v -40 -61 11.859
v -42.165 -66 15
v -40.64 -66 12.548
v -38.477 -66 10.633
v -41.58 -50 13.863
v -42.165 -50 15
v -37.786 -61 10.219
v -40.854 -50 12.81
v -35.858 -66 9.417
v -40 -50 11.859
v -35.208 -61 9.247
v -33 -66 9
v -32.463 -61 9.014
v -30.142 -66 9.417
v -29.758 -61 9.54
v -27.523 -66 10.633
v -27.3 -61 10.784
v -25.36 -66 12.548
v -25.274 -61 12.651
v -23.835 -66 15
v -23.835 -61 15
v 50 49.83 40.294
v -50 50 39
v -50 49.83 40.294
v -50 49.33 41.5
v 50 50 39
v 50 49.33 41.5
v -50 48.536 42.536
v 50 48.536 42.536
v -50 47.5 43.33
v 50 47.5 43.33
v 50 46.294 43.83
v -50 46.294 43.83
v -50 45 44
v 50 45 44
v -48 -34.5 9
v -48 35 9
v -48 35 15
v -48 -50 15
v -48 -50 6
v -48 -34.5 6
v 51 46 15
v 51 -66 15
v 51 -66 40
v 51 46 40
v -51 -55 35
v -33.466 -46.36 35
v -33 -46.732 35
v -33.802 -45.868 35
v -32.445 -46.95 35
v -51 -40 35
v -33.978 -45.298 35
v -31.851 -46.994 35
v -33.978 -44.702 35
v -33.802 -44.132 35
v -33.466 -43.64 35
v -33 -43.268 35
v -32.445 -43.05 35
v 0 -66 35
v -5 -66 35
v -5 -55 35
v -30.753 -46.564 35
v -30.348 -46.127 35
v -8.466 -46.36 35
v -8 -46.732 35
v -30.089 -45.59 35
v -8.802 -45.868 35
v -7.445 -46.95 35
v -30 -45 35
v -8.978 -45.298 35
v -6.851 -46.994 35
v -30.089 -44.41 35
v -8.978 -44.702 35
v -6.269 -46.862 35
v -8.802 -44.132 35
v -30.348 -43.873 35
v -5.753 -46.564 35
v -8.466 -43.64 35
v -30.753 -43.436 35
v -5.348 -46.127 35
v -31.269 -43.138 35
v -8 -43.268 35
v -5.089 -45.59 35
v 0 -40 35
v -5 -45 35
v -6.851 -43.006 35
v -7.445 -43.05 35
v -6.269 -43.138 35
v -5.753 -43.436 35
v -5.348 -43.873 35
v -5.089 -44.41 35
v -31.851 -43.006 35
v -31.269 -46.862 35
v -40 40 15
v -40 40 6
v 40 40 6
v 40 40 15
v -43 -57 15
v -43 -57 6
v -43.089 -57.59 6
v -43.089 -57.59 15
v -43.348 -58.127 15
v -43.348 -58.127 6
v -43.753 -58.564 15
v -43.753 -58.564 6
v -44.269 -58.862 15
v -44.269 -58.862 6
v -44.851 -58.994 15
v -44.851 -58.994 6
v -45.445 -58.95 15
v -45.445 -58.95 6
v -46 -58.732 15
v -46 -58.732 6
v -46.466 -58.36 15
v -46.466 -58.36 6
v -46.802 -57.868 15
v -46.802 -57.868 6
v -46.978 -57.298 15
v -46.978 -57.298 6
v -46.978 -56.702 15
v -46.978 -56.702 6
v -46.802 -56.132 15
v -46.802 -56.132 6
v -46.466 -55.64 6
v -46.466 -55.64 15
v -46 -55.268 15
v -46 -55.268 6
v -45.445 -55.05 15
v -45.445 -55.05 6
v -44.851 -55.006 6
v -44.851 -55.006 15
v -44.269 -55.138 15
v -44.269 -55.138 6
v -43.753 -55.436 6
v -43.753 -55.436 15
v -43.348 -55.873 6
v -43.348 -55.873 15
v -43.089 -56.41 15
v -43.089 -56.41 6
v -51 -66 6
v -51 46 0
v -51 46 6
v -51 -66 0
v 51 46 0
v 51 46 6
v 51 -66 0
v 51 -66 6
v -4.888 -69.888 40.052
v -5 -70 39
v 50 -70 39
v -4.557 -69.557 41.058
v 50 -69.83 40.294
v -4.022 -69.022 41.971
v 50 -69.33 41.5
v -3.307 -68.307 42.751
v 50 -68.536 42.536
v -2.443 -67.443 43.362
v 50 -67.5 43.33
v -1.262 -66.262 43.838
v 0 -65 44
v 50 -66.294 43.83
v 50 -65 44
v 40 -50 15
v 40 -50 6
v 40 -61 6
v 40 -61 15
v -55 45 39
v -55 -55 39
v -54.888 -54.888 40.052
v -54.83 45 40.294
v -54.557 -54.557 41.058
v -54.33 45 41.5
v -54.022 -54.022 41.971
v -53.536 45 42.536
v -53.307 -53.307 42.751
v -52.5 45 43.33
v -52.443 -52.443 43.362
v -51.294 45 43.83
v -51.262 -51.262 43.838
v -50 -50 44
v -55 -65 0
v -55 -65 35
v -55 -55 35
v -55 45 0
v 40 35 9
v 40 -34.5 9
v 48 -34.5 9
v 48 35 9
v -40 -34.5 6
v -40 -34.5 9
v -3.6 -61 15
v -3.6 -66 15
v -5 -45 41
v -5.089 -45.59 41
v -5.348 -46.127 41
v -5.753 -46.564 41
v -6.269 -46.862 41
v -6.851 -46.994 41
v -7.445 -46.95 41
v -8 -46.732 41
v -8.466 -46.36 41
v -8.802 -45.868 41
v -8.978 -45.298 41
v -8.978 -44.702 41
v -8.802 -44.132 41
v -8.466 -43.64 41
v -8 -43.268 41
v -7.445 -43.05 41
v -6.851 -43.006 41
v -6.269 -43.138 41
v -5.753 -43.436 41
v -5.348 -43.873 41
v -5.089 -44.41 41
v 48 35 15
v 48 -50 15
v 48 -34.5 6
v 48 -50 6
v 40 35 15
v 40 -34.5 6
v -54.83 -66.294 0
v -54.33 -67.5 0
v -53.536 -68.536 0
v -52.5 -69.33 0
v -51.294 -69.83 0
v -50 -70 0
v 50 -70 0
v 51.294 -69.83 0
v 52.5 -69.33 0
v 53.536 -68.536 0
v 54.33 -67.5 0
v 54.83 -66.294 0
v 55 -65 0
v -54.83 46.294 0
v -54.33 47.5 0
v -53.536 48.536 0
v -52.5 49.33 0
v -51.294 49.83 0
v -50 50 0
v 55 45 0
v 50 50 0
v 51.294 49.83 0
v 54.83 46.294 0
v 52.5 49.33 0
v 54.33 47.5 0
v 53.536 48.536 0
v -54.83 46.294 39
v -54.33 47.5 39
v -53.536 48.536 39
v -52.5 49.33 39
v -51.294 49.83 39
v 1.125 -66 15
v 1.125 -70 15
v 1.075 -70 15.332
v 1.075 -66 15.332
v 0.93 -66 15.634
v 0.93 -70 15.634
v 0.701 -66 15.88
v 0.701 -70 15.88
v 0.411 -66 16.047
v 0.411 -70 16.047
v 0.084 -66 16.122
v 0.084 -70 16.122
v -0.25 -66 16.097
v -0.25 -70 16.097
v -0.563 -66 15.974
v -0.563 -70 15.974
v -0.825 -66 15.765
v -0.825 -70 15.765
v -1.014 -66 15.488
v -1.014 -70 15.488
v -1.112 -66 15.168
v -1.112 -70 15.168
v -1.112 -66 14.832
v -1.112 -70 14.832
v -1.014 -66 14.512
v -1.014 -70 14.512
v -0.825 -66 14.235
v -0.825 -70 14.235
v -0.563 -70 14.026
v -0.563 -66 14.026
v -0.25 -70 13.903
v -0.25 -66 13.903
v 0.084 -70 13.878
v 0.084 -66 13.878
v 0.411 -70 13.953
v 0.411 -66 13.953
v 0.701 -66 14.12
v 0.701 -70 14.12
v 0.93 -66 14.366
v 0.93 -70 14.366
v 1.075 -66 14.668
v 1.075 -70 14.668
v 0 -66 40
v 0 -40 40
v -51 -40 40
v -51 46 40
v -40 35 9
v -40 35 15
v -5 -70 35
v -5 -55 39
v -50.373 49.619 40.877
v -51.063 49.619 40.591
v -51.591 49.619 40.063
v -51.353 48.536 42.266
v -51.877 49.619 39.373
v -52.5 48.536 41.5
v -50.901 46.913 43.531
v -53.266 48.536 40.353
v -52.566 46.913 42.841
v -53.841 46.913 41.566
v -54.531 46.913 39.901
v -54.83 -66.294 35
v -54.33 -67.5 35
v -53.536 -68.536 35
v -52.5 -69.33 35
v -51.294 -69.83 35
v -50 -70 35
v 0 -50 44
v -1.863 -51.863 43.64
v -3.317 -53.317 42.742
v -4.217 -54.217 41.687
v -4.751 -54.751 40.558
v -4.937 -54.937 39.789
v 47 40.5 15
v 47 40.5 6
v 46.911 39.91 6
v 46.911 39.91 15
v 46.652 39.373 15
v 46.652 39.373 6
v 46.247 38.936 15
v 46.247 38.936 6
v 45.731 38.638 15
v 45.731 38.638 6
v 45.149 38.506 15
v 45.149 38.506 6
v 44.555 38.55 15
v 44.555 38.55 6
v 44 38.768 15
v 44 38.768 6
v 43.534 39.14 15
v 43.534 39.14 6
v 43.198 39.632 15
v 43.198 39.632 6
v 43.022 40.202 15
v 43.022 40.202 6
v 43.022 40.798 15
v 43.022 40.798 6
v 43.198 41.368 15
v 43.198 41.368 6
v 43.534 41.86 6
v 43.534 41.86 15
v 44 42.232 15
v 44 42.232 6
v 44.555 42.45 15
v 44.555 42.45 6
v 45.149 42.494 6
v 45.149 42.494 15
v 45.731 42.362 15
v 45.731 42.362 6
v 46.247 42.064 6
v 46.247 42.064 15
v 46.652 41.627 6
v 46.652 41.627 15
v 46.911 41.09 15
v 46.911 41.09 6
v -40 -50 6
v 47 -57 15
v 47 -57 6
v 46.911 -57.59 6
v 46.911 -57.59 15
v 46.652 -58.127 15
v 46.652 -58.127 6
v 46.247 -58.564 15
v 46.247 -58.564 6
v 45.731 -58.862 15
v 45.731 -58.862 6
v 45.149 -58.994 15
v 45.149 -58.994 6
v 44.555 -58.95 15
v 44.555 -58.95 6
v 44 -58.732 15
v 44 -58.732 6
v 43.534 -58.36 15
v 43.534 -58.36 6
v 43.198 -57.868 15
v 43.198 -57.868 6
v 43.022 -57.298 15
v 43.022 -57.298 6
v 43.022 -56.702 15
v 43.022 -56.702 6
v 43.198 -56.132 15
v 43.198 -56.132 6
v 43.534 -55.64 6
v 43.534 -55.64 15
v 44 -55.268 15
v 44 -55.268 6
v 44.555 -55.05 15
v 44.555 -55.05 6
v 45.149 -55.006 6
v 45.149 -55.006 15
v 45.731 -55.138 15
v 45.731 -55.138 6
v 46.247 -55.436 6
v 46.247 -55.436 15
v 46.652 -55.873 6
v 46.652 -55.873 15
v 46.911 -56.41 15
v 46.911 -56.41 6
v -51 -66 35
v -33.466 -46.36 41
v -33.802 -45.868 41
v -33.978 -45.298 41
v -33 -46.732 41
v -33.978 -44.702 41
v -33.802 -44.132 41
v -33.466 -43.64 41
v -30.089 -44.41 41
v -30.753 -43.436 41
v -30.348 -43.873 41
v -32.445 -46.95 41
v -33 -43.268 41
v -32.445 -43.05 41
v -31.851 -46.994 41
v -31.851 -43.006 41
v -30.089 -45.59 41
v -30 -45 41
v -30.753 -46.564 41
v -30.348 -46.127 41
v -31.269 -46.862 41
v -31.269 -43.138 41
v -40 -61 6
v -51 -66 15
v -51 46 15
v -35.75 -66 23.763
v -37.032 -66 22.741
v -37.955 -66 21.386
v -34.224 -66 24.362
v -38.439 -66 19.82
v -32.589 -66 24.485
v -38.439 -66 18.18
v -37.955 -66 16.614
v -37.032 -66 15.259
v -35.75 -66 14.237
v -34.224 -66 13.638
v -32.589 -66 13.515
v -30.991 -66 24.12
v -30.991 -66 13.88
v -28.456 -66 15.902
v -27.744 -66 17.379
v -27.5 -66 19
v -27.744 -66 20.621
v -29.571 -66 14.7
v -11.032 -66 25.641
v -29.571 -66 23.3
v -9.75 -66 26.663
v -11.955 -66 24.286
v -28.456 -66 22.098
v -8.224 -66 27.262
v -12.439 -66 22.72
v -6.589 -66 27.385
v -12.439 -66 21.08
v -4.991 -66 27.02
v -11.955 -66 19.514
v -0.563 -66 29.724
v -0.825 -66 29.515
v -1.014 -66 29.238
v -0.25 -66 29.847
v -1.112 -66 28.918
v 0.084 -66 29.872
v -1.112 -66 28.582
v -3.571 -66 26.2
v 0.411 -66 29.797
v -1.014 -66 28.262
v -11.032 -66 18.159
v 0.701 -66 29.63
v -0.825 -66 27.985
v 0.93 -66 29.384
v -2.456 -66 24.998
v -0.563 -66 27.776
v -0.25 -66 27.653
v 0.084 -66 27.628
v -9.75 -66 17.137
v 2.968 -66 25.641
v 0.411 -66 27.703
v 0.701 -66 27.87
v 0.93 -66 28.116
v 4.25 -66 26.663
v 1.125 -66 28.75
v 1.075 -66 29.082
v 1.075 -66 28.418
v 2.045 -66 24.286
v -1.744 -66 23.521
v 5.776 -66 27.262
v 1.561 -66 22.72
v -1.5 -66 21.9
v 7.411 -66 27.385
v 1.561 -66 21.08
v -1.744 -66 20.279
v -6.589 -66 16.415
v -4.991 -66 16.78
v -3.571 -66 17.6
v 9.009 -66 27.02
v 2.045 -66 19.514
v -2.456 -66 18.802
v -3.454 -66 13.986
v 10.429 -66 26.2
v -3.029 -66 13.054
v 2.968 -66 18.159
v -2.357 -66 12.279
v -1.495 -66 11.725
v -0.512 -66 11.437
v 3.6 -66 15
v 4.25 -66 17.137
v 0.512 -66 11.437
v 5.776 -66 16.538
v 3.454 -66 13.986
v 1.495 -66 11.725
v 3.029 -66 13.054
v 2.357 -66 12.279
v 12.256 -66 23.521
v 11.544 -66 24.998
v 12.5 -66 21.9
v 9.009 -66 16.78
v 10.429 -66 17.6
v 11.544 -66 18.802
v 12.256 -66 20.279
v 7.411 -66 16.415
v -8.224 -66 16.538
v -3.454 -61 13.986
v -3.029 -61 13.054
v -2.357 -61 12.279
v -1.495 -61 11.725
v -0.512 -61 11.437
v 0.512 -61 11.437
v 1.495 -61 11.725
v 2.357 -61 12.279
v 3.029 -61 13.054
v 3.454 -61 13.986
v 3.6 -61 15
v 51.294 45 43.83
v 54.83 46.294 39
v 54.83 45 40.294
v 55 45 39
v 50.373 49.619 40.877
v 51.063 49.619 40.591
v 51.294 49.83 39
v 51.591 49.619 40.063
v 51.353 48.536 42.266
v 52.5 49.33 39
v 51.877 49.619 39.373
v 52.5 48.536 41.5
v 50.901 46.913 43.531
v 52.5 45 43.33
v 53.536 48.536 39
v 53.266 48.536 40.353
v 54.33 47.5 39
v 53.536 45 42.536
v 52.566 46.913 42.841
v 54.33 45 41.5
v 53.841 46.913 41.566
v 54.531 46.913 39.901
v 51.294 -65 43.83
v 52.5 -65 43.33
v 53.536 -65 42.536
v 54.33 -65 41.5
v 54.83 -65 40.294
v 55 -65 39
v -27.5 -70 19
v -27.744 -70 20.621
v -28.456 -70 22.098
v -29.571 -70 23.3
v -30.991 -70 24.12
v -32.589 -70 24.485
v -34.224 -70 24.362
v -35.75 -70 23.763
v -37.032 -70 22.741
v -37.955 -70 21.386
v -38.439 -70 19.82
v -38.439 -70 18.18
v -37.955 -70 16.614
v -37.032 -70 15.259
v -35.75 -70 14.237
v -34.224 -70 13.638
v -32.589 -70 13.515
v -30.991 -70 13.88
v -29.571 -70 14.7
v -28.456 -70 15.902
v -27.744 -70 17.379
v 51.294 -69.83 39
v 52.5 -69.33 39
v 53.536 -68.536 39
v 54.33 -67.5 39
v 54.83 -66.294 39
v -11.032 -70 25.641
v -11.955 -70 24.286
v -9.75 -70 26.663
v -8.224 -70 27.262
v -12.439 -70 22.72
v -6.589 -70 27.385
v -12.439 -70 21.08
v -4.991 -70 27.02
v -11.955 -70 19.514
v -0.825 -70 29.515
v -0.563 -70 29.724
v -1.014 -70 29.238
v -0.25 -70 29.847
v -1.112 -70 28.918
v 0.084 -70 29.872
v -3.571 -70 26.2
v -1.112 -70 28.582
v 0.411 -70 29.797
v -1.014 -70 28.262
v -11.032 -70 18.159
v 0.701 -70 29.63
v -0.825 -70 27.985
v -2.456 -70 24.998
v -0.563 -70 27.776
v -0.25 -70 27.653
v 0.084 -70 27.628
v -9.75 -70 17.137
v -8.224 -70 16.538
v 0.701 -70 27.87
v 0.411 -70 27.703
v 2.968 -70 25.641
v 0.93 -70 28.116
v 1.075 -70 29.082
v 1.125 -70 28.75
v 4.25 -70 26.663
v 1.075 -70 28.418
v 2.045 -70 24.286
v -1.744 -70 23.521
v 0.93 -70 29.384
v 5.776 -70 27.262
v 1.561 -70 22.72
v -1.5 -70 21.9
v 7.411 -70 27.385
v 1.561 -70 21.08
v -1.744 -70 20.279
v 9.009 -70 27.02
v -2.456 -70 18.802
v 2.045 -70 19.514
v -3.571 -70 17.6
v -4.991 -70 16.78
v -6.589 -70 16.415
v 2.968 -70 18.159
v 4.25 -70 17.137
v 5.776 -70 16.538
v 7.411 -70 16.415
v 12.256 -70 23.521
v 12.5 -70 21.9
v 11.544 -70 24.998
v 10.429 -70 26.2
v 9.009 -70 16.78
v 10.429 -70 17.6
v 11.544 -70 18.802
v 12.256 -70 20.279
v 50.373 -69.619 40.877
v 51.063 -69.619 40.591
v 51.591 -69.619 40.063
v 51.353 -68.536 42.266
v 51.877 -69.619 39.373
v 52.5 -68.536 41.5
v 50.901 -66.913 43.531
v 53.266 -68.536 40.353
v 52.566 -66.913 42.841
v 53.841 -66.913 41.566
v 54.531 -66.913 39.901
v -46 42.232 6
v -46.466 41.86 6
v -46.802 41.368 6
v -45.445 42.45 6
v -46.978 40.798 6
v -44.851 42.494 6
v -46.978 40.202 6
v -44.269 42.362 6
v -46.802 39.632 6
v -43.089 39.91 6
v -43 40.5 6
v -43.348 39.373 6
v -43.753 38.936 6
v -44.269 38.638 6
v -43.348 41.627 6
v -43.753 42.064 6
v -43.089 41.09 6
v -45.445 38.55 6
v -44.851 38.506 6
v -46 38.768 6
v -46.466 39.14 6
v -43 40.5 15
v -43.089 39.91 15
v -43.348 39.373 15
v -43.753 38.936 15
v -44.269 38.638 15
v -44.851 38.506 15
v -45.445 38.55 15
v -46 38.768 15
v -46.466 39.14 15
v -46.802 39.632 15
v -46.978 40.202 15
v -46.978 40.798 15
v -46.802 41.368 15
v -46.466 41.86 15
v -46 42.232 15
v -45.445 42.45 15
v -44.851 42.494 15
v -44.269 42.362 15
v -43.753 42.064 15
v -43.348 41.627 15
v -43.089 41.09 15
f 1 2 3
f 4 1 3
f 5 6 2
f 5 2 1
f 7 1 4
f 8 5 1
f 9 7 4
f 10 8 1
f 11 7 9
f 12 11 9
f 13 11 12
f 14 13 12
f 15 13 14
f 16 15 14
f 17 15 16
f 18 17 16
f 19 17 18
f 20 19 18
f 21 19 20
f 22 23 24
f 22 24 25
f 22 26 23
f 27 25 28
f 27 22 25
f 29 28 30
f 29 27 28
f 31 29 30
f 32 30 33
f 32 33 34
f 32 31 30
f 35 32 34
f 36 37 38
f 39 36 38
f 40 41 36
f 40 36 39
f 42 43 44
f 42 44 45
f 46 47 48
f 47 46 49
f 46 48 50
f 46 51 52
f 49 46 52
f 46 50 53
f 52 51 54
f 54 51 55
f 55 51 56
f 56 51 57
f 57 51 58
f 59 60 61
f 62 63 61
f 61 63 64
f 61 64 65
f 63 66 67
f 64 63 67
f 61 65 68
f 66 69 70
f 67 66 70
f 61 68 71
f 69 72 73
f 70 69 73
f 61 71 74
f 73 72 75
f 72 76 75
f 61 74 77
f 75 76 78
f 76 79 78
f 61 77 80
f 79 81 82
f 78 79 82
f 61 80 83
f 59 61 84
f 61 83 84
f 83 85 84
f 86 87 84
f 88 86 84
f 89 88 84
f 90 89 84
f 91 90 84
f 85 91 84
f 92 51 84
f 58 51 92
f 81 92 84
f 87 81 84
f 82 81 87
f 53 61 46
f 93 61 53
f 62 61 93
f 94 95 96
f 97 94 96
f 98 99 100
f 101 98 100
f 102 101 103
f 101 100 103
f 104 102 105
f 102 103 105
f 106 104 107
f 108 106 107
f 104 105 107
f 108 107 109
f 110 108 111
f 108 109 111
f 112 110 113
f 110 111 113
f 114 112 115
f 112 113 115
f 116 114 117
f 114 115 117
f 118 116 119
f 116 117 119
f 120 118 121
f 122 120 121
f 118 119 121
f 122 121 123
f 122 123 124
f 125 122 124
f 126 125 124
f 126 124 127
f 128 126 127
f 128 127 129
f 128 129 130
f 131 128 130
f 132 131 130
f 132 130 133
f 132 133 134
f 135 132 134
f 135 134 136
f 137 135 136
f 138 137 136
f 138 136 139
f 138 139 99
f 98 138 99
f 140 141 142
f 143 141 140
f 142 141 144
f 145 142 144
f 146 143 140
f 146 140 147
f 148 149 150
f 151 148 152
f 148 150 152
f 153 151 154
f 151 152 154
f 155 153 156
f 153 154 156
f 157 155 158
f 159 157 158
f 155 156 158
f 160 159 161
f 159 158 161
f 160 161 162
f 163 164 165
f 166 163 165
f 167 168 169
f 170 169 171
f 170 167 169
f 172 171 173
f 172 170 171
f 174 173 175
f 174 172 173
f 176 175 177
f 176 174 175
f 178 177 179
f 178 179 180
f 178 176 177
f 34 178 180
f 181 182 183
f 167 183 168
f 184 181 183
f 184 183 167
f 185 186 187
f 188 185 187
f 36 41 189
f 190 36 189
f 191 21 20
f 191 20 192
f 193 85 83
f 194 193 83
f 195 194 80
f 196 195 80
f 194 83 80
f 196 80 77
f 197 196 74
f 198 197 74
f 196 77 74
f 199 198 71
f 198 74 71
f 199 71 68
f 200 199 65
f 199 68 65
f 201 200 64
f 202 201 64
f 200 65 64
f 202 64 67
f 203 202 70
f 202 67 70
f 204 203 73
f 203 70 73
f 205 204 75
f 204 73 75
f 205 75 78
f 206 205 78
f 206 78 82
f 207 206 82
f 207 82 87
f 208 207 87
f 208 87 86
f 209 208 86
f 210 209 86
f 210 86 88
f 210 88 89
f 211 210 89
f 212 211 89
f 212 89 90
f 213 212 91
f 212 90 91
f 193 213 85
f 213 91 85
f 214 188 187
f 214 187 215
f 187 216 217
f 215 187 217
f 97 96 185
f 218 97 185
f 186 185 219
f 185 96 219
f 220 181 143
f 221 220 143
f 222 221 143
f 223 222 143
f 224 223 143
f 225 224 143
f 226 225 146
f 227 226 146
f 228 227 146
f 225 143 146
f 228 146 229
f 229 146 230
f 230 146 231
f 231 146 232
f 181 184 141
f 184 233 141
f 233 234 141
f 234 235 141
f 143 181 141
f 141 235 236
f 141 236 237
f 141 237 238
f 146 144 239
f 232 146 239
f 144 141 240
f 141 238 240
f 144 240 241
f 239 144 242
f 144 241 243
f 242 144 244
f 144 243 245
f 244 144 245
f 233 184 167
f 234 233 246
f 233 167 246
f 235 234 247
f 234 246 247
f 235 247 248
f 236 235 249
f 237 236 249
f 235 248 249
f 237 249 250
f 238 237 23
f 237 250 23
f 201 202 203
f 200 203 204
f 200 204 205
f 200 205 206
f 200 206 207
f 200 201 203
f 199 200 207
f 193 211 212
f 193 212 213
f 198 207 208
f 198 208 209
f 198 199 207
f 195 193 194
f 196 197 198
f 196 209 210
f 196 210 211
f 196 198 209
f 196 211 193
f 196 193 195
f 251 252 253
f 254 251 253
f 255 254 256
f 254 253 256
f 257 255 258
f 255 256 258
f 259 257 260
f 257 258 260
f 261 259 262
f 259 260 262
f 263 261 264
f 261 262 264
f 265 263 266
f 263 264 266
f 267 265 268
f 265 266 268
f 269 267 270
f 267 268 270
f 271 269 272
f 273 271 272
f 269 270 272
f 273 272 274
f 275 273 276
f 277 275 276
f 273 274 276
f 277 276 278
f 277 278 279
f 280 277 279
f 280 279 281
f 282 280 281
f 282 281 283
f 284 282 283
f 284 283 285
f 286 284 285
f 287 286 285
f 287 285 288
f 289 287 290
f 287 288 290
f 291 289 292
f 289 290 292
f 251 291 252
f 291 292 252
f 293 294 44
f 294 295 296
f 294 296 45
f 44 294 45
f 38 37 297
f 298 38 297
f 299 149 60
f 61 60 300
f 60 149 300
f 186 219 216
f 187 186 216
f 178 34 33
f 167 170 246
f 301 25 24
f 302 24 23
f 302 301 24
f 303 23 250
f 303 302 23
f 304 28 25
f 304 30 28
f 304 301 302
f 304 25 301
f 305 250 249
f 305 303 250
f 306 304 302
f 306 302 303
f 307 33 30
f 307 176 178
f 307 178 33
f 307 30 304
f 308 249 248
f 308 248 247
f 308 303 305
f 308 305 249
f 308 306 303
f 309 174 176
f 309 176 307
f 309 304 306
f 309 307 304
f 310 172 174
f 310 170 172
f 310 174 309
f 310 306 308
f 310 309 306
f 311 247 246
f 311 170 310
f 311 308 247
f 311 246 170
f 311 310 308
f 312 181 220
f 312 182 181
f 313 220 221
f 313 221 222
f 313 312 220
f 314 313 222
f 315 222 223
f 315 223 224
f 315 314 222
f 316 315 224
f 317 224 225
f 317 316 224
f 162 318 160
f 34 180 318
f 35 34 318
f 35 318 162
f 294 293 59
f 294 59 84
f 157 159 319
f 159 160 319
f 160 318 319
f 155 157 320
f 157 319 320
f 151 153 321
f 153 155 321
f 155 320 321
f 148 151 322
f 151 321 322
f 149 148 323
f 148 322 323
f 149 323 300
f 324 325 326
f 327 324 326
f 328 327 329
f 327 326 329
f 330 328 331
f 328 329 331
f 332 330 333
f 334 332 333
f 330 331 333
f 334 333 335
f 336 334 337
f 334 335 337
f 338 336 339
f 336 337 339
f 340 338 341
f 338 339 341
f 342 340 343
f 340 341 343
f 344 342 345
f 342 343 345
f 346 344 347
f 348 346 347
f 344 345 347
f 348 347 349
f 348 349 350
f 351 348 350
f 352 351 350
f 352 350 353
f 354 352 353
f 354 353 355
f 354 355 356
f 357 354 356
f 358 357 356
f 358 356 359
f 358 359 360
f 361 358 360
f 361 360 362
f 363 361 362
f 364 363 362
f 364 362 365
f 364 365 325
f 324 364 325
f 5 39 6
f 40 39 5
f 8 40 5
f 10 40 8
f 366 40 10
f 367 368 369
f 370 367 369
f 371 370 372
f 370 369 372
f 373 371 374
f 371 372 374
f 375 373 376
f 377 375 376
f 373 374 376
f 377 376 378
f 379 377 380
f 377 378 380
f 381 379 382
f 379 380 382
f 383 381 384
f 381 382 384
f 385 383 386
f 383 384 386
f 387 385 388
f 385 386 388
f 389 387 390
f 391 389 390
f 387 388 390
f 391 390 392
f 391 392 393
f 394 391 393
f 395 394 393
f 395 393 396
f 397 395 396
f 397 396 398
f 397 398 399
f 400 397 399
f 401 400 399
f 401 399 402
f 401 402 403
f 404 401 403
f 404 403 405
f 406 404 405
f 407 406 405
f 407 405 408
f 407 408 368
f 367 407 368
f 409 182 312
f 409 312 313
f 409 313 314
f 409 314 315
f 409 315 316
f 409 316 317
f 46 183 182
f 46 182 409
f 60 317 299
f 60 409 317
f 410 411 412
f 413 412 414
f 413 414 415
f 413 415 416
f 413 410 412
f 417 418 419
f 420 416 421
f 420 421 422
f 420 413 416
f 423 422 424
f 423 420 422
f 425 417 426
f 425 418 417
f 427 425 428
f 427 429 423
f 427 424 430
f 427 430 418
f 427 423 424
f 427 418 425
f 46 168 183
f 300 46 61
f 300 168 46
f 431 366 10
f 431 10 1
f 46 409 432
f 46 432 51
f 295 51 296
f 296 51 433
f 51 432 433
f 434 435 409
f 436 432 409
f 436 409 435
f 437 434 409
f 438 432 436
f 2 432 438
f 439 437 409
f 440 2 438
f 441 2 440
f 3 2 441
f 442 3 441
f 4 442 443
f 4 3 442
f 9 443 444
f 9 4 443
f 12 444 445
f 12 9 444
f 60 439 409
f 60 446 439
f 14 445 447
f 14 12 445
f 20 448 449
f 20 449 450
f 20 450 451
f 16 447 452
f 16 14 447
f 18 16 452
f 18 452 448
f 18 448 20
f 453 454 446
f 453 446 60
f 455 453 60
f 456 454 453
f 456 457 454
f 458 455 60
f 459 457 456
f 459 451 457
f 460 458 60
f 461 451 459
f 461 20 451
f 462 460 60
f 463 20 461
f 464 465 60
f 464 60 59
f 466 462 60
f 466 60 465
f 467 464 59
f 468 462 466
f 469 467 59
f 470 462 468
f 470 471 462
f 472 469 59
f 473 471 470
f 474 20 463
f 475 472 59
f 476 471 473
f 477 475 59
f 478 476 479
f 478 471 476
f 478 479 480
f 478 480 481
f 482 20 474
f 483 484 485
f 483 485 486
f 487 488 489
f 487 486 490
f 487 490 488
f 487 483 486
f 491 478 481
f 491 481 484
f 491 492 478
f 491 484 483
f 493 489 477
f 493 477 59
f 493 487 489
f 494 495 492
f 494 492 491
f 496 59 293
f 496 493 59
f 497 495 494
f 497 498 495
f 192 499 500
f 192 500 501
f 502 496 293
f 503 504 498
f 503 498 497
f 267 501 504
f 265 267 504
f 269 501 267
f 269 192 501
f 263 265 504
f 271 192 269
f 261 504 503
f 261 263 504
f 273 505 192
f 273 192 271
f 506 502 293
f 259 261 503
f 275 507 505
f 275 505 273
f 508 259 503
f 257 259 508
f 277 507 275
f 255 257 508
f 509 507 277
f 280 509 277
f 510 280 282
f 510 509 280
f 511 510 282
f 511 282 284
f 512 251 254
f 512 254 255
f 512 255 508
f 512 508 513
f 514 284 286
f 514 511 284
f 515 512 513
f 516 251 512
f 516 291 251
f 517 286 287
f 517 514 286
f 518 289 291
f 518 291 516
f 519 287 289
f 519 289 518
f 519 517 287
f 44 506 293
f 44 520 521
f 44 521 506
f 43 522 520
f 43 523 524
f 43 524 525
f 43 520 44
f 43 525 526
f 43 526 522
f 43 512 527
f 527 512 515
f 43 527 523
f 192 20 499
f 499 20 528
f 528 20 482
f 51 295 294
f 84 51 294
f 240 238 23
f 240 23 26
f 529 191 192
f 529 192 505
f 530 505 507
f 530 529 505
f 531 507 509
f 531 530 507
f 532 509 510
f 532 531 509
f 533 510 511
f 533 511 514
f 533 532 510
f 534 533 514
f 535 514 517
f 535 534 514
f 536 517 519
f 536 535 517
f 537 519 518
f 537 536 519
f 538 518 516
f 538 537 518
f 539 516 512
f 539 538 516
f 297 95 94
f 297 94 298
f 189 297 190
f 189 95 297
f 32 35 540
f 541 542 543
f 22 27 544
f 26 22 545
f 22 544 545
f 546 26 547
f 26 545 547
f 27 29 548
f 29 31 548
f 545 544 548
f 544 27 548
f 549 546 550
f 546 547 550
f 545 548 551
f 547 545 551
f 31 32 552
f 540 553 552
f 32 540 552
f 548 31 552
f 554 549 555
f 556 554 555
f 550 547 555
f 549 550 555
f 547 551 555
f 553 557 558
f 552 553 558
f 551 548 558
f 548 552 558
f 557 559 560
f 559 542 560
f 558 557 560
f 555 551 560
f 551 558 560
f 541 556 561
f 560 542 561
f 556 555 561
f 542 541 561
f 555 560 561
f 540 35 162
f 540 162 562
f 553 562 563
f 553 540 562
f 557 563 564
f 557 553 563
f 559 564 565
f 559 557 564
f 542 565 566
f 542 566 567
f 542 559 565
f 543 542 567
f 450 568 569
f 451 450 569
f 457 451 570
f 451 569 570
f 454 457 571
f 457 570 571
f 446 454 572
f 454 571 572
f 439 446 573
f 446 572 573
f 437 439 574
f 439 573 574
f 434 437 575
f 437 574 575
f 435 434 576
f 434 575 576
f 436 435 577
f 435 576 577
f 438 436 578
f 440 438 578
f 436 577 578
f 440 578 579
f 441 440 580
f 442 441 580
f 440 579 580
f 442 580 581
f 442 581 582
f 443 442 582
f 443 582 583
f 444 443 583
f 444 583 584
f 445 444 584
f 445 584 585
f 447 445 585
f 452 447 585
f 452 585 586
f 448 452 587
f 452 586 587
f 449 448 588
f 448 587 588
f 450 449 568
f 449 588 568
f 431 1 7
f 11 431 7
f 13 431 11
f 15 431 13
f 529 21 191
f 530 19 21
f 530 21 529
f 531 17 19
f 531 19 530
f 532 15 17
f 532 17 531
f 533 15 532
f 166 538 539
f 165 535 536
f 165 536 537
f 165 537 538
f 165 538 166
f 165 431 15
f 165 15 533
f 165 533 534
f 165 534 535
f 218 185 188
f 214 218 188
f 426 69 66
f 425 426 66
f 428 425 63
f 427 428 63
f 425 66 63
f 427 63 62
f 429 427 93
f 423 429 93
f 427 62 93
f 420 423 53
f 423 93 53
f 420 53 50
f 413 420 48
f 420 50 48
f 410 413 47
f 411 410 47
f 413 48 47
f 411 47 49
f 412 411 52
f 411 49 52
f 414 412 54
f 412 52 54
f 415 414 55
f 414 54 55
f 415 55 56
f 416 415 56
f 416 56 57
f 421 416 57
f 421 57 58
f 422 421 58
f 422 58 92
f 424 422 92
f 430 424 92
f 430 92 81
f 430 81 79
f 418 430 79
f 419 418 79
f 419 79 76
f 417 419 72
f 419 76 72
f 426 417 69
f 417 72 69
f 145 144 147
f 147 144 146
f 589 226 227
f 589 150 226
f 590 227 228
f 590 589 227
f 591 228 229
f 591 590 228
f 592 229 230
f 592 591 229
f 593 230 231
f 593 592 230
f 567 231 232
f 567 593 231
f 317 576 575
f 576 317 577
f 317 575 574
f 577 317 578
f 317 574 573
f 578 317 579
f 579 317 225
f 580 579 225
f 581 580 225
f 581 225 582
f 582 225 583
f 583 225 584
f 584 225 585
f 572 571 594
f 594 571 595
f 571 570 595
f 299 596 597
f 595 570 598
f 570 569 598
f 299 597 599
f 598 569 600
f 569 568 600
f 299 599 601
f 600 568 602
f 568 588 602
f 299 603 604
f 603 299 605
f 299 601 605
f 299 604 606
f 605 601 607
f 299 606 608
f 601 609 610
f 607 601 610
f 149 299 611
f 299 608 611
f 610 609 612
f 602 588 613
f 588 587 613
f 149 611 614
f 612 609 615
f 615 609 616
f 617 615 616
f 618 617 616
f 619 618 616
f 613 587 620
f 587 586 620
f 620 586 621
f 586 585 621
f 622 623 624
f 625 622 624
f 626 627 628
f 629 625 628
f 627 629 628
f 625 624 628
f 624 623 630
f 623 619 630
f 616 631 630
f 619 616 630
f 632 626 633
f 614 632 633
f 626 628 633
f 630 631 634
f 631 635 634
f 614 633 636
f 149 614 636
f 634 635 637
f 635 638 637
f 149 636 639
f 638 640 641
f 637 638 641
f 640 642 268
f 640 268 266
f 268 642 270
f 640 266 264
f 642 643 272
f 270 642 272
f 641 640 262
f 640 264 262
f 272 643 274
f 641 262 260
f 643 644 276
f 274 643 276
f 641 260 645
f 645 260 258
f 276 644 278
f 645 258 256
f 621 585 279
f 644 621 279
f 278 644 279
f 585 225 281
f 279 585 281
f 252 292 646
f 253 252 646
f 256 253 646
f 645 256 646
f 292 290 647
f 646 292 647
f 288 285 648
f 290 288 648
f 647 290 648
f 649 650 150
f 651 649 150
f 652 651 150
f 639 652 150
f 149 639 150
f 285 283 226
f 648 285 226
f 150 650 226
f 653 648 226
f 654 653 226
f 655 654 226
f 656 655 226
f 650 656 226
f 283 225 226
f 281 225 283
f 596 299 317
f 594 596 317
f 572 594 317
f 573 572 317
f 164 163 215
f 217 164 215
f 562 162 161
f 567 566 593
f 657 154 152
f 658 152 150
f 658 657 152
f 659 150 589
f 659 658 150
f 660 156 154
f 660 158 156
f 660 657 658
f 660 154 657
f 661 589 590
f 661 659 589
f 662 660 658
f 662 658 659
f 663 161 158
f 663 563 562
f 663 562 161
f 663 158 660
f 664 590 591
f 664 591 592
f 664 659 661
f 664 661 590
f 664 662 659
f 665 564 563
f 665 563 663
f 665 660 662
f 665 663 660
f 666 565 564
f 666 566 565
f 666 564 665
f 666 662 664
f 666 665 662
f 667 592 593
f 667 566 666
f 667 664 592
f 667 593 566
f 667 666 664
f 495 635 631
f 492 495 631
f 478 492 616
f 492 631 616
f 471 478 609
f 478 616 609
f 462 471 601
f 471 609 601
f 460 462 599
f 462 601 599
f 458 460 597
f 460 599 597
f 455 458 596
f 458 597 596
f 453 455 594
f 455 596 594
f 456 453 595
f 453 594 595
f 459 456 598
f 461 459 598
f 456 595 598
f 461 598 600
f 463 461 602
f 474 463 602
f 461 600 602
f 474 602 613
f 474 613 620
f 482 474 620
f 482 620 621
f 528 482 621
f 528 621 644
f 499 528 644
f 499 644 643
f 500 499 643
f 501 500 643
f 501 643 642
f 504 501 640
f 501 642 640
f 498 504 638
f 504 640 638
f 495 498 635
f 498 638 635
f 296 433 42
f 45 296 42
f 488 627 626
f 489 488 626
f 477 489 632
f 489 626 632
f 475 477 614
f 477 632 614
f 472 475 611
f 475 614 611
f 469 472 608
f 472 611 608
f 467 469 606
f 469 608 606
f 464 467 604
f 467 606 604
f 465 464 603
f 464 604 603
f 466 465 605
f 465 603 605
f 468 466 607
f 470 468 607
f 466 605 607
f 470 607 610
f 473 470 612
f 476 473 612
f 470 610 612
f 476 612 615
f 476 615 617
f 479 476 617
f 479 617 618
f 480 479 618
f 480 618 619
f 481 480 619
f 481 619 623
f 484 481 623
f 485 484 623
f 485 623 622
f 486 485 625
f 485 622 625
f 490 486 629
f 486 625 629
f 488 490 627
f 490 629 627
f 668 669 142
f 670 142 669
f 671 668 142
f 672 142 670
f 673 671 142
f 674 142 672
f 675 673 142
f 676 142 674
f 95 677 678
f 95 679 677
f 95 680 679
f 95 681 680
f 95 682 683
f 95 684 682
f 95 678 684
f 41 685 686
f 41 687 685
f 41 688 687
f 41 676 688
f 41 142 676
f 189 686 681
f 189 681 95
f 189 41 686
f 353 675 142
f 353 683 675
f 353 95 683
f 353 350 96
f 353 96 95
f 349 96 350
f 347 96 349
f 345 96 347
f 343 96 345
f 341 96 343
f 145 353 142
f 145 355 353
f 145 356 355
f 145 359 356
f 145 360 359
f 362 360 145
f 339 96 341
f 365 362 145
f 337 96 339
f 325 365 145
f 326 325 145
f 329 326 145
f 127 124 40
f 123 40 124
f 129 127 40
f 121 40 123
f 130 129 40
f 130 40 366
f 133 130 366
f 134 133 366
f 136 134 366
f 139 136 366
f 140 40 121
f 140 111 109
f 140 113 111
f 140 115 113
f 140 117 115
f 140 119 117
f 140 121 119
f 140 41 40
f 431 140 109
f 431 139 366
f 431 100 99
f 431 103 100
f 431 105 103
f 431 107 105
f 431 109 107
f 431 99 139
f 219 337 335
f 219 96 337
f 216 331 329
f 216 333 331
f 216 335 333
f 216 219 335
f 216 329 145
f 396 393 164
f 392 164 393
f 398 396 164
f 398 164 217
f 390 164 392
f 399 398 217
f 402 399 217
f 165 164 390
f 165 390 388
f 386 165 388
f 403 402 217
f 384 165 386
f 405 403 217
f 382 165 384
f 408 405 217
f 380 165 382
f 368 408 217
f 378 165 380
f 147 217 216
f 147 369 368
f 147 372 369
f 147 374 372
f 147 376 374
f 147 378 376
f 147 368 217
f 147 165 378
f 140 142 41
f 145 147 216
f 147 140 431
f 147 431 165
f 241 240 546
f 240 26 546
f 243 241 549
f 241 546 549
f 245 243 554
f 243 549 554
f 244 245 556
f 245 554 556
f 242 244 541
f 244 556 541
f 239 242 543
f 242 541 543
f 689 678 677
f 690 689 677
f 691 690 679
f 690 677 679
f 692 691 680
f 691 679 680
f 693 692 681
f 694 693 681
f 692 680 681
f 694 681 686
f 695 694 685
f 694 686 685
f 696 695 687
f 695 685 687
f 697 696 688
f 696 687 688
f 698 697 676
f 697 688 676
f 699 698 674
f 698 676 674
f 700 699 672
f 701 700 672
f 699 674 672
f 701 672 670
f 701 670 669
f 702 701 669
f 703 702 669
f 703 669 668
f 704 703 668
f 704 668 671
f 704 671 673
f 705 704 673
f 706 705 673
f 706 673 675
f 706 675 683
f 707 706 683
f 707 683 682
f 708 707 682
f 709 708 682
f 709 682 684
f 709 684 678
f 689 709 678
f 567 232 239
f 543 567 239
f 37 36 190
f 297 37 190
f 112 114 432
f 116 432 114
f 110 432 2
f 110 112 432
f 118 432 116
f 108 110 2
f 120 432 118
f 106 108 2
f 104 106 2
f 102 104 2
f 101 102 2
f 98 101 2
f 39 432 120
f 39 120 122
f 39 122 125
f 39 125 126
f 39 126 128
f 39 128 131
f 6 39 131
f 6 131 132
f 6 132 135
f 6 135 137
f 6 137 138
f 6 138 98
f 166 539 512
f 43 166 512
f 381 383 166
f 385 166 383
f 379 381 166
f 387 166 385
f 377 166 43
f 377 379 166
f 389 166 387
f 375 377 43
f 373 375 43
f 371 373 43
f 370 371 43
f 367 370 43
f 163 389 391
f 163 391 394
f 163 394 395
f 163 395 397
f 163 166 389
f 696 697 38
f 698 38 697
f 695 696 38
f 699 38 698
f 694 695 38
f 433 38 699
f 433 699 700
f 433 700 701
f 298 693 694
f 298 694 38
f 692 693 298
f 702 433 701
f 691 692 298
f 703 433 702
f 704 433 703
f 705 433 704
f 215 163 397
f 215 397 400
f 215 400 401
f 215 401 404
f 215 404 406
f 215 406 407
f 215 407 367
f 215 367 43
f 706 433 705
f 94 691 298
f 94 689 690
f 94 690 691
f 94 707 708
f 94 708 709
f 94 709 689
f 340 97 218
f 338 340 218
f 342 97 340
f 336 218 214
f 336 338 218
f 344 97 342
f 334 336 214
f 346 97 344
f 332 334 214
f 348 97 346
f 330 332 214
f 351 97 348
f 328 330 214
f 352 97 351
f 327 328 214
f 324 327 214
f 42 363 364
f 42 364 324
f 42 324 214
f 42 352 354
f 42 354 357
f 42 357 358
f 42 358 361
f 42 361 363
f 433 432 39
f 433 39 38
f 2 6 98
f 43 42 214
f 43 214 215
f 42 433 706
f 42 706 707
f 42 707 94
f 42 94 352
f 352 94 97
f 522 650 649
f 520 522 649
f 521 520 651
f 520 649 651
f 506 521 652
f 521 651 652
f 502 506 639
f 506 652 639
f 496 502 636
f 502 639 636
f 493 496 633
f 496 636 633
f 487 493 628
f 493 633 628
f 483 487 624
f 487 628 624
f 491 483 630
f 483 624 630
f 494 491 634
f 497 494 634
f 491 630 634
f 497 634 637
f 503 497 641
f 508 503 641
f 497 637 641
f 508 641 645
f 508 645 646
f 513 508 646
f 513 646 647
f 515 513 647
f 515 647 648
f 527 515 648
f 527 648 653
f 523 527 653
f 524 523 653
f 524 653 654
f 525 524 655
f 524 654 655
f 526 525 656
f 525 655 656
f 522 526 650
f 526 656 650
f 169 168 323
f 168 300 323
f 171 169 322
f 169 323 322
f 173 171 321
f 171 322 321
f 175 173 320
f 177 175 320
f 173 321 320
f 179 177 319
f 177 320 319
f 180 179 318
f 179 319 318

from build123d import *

# Parameters (mm, degrees)
SKETCH001_W       = 110
SKETCH001_H       = 120
PAD005_DEPTH      = 44
SKETCH002_W       = 102
SKETCH002_H       = 112
POCKET002_DEPTH   = 6
SKETCH010_R       = 2
SKETCH010_W       = 80
SKETCH010_H       = 101
SKETCH010_W_2     = 96
SKETCH010_H_2     = 15.5
POCKET003_DEPTH   = 10
SKETCH011_W       = 96
SKETCH011_H       = 85
POCKET004_DEPTH   = 7
SKETCH012_W       = 102
SKETCH012_H       = 112
POCKET005_DEPTH   = 25
SKETCH014_W       = 55
SKETCH014_H       = 30
PAD006_DEPTH      = 9
SKETCH013_W       = 50
SKETCH013_H       = 15
POCKET006_DEPTH   = 9
FILLET_R          = 5
SKETCH015_R       = 2
POCKET007_DEPTH   = 6
CYLINDER003_R     = 3.6
CYLINDER003_DEPTH = 5
CYLINDER004_R     = 10
CYLINDER004_DEPTH = 16
SKETCH016_R       = 5.5
SKETCH016_R_2     = 1.125
POCKET008_DEPTH   = 4


with BuildPart() as part:
    # Sketch001 → Pad005 (new body)
    with BuildSketch(Plane.XY):
        with Locations((0, -10)):
            Rectangle(SKETCH001_W, SKETCH001_H)
    extrude(amount=PAD005_DEPTH)

    # Sketch002 (on Face5 of Pad005) → Pocket002 (cut)
    with BuildSketch(Plane(origin=(0, 0, 0), x_dir=(1, 0, 0), z_dir=(0, 0, -1))):
        with Locations((0, 10)):
            Rectangle(SKETCH002_W, SKETCH002_H)
    extrude(amount=-POCKET002_DEPTH, mode=Mode.SUBTRACT)

    # Sketch010 (on Face11 of Pocket002) → Pocket003 (cut)
    with BuildSketch(Plane(origin=(0, 0, 6), x_dir=(1, 0, 0), z_dir=(0, 0, -1))):
        with Locations((-45, 57)):
            Circle(SKETCH010_R)
        with Locations((45, 57)):
            Circle(SKETCH010_R)
        with Locations((45, -40.5)):
            Circle(SKETCH010_R)
        with Locations((-45, -40.5)):
            Circle(SKETCH010_R)
        with Locations((0, 10.5)):
            Rectangle(SKETCH010_W, SKETCH010_H)
        with Locations((0, 42.25)):
            Rectangle(SKETCH010_W_2, SKETCH010_H_2)
    extrude(amount=-POCKET003_DEPTH, mode=Mode.SUBTRACT)

    # Sketch011 → Pocket004 (cut)
    with BuildSketch(Plane.XY.offset(9)):
        with Locations((0, -7.5)):
            Rectangle(SKETCH011_W, SKETCH011_H)
    extrude(amount=POCKET004_DEPTH, mode=Mode.SUBTRACT)

    # Sketch012 → Pocket005 (cut)
    with BuildSketch(Plane.XY.offset(15)):
        with Locations((0, -10)):
            Rectangle(SKETCH012_W, SKETCH012_H)
    extrude(amount=POCKET005_DEPTH, mode=Mode.SUBTRACT)

    # Sketch014 (on Face5 of Pocket005) → Pad006 (join)
    with BuildSketch(Plane.XY.offset(44)):
        with Locations((-27.5, -55)):
            Rectangle(SKETCH014_W, SKETCH014_H)
    extrude(amount=-PAD006_DEPTH)

    # Sketch013 (on Face5 of Pocket005) → Pocket006 (cut)
    with BuildSketch(Plane.XY.offset(44)):
        with Locations((-30, -62.5)):
            Rectangle(SKETCH013_W, SKETCH013_H)
    extrude(amount=-POCKET006_DEPTH, mode=Mode.SUBTRACT)

    # Fillet
    fillet_edges = [part.edges().sort_by_distance(p)[0] for p in [
        (55, -10, 44),
        (25, -70, 44),
        (-5, -62.5, 44),
        (-30, -55, 44),
        (-55, -2.5, 44),
        (0, 50, 44),
        (-55, 50, 22),
        (-55, -70, 17.5),
        (55, -70, 22),
        (55, 50, 22),
    ]]
    fillet(fillet_edges, radius=FILLET_R)

    # Sketch015 (on Face26 of Fillet) → Pocket007 (cut)
    with BuildSketch(Plane(origin=(0, 0, 35), x_dir=(1, 0, 0), z_dir=(0, 0, -1))):
        with Locations((-7, 45)):
            Circle(SKETCH015_R)
        with Locations((-32, 45)):
            Circle(SKETCH015_R)
    extrude(amount=-POCKET007_DEPTH, mode=Mode.SUBTRACT)

    # Cylinder003 → Cylinder003 (cut)
    with BuildSketch(Plane(origin=(0, -61, 15), x_dir=(1, 0, 0), z_dir=(0, -1, 0))):
        Circle(CYLINDER003_R)
    extrude(amount=CYLINDER003_DEPTH, mode=Mode.SUBTRACT)

    # Cylinder004 → Cylinder004 (cut)
    with BuildSketch(Plane(origin=(-33, -50, 19), x_dir=(1, 0, 0), z_dir=(0, -1, 0))):
        Circle(CYLINDER004_R)
    extrude(amount=CYLINDER004_DEPTH, mode=Mode.SUBTRACT)

    # Sketch016 (on Face6 of Pocket007) → Pocket008 (cut)
    with BuildSketch(Plane.XZ.offset(70)):
        with Locations((-7, 21.9)):
            Circle(SKETCH016_R)
        with Locations((7, 21.9)):
            Circle(SKETCH016_R)
        with Locations((0, 28.75)):
            Circle(SKETCH016_R_2)
        with Locations((0, 15)):
            Circle(SKETCH016_R_2)
        with Locations((-33, 19)):
            Circle(SKETCH016_R)
    extrude(amount=-POCKET008_DEPTH, mode=Mode.SUBTRACT)


solid = part.part
